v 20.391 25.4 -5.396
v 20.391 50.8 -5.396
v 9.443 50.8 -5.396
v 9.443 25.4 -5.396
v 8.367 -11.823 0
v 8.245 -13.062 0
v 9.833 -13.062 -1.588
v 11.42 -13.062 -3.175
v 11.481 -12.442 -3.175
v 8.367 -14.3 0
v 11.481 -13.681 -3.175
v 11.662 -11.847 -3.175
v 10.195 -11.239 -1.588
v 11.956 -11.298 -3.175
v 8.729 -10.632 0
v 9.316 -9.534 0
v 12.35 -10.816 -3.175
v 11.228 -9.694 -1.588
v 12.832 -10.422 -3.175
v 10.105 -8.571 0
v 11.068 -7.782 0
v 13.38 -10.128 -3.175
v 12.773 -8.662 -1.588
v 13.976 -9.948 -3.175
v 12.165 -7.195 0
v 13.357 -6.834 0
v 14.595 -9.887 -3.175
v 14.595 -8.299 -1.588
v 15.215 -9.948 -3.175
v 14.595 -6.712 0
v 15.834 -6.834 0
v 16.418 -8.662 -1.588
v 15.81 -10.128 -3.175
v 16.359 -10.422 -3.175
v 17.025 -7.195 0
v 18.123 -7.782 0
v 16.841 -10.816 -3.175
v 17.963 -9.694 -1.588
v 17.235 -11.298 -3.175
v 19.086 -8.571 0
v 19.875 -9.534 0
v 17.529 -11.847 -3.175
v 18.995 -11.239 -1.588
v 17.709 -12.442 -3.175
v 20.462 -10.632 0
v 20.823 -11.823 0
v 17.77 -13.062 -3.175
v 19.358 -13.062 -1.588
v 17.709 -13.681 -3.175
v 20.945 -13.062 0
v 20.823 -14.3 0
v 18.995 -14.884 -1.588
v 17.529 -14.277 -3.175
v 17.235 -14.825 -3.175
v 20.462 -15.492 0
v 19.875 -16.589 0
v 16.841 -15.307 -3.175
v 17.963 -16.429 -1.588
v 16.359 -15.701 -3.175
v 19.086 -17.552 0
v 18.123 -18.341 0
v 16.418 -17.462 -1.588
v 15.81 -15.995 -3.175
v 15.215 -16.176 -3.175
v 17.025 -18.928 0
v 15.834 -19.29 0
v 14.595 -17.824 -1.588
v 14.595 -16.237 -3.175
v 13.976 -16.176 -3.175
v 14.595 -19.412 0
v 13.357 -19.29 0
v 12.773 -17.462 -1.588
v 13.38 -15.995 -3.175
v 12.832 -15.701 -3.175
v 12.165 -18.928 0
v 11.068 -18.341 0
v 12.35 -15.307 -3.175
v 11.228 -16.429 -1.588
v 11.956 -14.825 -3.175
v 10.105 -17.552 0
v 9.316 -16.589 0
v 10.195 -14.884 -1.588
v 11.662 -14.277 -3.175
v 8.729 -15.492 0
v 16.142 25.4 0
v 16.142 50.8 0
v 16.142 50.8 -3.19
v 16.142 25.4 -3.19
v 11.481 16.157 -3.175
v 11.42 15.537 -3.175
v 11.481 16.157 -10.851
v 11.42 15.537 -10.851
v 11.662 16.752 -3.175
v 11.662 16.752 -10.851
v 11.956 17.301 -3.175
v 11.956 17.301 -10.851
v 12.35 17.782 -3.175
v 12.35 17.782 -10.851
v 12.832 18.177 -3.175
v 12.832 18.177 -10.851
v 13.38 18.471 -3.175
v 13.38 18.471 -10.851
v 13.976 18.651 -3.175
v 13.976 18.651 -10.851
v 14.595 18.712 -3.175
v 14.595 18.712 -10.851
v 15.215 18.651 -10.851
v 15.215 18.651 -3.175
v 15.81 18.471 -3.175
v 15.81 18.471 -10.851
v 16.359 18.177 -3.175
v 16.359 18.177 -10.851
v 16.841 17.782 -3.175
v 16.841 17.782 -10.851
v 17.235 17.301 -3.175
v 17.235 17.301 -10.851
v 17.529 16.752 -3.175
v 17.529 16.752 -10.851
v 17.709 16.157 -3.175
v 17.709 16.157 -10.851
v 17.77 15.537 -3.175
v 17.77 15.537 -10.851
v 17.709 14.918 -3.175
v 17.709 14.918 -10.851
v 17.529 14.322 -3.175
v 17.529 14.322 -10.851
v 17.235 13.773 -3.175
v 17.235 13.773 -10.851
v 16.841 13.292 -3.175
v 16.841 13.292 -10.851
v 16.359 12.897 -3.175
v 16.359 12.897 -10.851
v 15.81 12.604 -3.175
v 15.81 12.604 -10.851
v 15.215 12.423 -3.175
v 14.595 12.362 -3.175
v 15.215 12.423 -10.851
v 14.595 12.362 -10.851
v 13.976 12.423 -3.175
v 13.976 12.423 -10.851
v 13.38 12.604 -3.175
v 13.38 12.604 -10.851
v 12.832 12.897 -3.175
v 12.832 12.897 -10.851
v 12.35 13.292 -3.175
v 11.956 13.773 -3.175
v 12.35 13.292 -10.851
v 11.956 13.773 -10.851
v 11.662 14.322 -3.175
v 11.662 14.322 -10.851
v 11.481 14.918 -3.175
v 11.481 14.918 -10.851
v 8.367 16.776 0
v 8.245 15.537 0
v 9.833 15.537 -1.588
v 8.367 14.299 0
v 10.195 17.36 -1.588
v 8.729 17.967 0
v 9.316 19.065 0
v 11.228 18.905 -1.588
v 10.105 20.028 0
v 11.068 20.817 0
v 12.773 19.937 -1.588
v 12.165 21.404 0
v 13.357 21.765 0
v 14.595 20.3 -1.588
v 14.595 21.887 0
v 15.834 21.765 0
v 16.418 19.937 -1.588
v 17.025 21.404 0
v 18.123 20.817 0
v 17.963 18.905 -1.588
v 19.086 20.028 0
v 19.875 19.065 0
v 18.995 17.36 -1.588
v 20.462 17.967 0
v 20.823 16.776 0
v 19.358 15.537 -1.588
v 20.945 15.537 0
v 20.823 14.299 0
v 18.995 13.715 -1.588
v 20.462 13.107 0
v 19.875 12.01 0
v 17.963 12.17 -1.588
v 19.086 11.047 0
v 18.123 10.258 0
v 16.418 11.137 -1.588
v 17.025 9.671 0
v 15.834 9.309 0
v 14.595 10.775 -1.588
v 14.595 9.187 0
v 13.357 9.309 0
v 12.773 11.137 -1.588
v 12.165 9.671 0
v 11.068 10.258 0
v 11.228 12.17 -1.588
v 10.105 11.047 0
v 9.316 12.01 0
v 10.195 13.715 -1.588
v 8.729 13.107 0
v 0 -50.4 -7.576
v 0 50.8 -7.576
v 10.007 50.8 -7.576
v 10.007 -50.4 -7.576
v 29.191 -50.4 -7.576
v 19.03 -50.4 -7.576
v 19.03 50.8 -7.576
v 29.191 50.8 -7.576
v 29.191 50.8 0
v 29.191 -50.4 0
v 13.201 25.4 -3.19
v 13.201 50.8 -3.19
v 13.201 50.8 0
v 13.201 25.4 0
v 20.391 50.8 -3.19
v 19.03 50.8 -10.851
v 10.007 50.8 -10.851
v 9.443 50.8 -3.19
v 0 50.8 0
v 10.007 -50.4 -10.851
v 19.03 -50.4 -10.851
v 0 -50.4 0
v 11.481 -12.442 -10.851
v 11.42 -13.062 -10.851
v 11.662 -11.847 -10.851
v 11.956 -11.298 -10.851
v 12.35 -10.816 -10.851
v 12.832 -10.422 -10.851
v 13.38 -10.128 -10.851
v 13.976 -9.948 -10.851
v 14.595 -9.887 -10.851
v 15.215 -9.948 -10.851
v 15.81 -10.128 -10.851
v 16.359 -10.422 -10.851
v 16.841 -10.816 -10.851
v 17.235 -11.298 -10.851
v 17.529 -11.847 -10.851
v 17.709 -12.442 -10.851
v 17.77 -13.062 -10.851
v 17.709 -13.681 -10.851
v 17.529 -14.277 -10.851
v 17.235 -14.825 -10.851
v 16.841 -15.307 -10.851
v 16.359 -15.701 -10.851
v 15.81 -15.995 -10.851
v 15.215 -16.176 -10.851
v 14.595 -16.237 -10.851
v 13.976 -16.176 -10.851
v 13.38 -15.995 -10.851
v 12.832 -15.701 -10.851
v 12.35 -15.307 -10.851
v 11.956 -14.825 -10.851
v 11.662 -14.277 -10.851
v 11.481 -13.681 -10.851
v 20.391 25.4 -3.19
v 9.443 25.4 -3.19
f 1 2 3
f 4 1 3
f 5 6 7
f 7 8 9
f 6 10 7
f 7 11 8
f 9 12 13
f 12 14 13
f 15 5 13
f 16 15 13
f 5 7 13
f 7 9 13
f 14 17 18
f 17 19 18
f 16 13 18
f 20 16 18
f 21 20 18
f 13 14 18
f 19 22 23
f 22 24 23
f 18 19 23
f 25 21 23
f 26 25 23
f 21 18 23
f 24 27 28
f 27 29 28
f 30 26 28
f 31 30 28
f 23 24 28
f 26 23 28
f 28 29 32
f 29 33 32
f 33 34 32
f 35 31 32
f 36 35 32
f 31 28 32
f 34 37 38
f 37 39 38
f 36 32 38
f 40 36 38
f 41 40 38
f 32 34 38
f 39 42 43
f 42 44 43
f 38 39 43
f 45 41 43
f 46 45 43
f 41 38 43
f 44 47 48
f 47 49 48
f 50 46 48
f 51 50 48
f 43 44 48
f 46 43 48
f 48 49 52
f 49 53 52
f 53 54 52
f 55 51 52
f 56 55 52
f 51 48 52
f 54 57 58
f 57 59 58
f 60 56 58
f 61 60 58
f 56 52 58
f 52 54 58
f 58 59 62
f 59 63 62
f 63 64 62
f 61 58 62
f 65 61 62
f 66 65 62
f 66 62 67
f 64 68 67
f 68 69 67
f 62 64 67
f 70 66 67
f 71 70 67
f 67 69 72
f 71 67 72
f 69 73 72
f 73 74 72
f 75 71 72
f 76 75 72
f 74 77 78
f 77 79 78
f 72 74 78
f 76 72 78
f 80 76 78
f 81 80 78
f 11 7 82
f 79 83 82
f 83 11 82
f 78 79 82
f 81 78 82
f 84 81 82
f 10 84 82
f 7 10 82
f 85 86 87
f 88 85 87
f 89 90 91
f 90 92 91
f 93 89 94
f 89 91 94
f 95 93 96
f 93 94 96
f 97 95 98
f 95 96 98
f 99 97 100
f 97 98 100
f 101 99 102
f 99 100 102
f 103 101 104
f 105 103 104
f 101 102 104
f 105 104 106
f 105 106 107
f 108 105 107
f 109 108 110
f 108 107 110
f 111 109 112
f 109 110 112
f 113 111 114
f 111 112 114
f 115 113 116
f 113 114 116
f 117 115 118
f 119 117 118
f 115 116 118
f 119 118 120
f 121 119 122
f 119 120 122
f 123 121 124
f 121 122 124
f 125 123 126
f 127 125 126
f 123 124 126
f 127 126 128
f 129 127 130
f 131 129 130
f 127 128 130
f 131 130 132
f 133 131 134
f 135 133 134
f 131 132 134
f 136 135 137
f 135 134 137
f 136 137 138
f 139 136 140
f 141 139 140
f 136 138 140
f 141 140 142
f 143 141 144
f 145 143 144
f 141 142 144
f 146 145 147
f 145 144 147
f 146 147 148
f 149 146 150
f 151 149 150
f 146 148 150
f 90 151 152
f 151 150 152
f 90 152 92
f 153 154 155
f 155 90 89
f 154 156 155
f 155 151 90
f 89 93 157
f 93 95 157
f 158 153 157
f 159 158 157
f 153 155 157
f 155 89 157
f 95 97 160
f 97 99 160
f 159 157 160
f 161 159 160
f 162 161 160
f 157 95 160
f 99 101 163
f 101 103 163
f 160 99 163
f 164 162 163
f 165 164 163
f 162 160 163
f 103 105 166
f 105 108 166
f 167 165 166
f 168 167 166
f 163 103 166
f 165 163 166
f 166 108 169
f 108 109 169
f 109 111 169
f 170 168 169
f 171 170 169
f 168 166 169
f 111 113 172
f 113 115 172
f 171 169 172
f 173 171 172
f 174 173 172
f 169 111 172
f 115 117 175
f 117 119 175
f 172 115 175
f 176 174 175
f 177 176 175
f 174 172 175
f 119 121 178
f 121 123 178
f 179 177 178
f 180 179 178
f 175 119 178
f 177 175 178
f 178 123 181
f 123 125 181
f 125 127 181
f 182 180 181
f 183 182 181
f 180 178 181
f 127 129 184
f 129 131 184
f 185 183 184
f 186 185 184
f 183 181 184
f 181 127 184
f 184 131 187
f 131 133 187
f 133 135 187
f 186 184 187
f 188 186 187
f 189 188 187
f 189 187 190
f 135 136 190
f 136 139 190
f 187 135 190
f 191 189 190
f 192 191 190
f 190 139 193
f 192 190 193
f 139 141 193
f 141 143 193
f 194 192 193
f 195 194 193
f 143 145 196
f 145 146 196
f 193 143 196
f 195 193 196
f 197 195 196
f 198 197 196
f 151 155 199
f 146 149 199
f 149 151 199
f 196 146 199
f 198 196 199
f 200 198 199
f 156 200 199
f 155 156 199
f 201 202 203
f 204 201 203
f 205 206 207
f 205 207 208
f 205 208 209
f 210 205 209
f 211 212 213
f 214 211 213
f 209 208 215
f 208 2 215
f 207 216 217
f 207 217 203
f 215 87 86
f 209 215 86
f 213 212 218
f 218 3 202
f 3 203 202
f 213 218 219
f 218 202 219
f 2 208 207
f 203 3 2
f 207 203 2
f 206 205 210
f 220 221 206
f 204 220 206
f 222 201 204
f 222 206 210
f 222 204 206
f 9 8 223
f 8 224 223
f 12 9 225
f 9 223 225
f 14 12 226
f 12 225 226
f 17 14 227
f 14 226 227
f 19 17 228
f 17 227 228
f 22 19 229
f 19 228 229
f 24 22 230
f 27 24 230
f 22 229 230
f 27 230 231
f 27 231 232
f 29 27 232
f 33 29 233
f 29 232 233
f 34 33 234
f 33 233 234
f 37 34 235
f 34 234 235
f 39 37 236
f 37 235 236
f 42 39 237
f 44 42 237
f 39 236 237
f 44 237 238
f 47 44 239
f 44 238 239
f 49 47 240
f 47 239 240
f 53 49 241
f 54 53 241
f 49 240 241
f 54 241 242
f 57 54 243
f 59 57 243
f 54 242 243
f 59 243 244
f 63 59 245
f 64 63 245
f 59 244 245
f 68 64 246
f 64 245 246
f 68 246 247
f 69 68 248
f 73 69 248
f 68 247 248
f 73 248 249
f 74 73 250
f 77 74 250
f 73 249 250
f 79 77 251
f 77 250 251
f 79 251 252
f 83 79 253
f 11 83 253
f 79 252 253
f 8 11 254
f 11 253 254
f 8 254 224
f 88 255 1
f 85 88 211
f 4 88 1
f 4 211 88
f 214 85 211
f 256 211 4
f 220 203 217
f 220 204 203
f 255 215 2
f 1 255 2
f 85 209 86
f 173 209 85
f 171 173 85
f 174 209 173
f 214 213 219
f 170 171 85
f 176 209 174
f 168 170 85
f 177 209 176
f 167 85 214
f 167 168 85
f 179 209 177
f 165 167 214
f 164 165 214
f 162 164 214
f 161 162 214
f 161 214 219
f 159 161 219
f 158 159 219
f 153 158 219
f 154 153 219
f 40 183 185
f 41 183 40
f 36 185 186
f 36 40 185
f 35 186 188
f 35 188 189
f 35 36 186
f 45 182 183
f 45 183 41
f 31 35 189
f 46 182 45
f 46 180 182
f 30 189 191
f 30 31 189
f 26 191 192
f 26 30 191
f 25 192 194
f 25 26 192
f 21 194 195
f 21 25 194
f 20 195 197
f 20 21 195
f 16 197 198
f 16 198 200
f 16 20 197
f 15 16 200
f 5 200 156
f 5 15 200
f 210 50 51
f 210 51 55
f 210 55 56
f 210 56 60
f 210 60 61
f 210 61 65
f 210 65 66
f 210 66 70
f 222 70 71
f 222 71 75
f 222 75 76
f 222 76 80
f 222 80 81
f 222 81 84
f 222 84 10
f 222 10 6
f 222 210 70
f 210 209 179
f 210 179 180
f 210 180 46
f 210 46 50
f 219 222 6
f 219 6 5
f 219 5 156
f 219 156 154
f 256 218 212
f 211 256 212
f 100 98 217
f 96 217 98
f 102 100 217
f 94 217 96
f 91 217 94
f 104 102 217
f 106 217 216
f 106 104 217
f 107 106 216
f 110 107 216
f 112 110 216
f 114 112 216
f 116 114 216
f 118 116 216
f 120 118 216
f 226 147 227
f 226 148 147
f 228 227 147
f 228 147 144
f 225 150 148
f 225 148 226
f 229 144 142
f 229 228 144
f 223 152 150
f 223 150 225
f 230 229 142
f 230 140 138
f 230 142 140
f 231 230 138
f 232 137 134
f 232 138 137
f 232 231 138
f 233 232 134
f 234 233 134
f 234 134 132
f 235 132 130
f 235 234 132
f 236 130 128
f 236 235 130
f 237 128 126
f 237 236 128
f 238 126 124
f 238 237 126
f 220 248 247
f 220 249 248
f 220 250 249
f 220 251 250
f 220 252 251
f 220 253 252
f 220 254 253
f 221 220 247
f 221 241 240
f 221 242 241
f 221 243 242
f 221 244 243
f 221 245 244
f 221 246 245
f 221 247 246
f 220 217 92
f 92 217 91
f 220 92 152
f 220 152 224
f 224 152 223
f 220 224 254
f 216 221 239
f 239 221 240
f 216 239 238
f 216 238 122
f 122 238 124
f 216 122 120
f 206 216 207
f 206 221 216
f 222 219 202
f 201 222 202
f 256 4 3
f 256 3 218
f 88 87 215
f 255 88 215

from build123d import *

# Parameters (mm, degrees)
F1_DEPTH       = 25
F2_DEPTH       = 2.1844
F3_DEPTH       = 25.4
F5_D           = 6.35
F5_CSINK_D     = 12.7
F5_CSINK_ANGLE = 90
F6_DEPTH       = 5.08
F7_DEPTH       = 25.4
F8_DEPTH       = 25.4
F9_DEPTH       = 4.064
F11_DEPTH      = 25.4


with BuildPart() as f1:
    # F0 (on Front) → F1 (new body)
    with BuildSketch(Plane.XZ):
        Polygon((29.1909072548, 0), (0, 0), (0, -7.5760227628), (12.1912453324, -7.5760227628), (12.1912453324, -10.8513226733), (18.013689667, -10.8513226733), (18.013689667, -7.5760227628), (29.1909072548, -7.5760227628), align=None)
    extrude(amount=F1_DEPTH)

    # F2 (add): a face of the model
    f2_faces = [f1.faces().sort_by_distance(p)[0] for p in [
        (12.1912453324, -12.5, -9.213672718),
    ]]
    extrude(f2_faces, amount=F2_DEPTH)

    # F3 (add): a face of the model
    f3_faces = [f1.faces().sort_by_distance(p)[0] for p in [
        (14.5334168429, 0, -4.3631968941),
    ]]
    extrude(f3_faces, amount=F3_DEPTH)

    # F5 (through all)
    with Locations(Plane.XY):
        with Locations((14.5954536274, 15.5374109745), (14.5954536274, -13.0615523085)):
            CounterSinkHole(F5_D / 2, F5_CSINK_D / 2, counter_sink_angle=F5_CSINK_ANGLE)

    # F6 (add): a face of the model
    f6_faces = [f1.faces().sort_by_distance(p)[0] for p in [
        (18.013689667, 0.2, -9.213672718),
    ]]
    extrude(f6_faces, amount=F6_DEPTH)

    # F7 (add): a face of the model
    f7_faces = [f1.faces().sort_by_distance(p)[0] for p in [
        (14.9128222173, -25, -4.6688801497),
    ]]
    extrude(f7_faces, amount=F7_DEPTH)

    # F8 (add): a face of the model
    f8_faces = [f1.faces().sort_by_distance(p)[0] for p in [
        (14.9128222173, 25.4, -4.6688801497),
    ]]
    extrude(f8_faces, amount=F8_DEPTH)

    # F9 (cut): a face of the model
    f9_faces = [f1.faces().sort_by_distance(p)[0] for p in [
        (23.093689667, 0.2, -9.213672718),
    ]]
    extrude(f9_faces, amount=-F9_DEPTH, mode=Mode.SUBTRACT)

    # F10 (on face) → F11 (cut)
    with BuildSketch(Plane(origin=(0, 50.8, 0), x_dir=(-1, 0, 0), z_dir=(0, 1, 0))):
        Polygon((-13.2008893415, 0), (-16.1421988159, 0), (-16.1421988159, -3.189817071), (-20.3907564282, -3.189817071), (-20.3907564282, -5.3957989439), (-9.4425510615, -5.3957989439), (-9.4425510615, -3.189817071), (-13.2008893415, -3.189817071), align=None)
    extrude(amount=-F11_DEPTH, mode=Mode.SUBTRACT)


solid = f1.part
